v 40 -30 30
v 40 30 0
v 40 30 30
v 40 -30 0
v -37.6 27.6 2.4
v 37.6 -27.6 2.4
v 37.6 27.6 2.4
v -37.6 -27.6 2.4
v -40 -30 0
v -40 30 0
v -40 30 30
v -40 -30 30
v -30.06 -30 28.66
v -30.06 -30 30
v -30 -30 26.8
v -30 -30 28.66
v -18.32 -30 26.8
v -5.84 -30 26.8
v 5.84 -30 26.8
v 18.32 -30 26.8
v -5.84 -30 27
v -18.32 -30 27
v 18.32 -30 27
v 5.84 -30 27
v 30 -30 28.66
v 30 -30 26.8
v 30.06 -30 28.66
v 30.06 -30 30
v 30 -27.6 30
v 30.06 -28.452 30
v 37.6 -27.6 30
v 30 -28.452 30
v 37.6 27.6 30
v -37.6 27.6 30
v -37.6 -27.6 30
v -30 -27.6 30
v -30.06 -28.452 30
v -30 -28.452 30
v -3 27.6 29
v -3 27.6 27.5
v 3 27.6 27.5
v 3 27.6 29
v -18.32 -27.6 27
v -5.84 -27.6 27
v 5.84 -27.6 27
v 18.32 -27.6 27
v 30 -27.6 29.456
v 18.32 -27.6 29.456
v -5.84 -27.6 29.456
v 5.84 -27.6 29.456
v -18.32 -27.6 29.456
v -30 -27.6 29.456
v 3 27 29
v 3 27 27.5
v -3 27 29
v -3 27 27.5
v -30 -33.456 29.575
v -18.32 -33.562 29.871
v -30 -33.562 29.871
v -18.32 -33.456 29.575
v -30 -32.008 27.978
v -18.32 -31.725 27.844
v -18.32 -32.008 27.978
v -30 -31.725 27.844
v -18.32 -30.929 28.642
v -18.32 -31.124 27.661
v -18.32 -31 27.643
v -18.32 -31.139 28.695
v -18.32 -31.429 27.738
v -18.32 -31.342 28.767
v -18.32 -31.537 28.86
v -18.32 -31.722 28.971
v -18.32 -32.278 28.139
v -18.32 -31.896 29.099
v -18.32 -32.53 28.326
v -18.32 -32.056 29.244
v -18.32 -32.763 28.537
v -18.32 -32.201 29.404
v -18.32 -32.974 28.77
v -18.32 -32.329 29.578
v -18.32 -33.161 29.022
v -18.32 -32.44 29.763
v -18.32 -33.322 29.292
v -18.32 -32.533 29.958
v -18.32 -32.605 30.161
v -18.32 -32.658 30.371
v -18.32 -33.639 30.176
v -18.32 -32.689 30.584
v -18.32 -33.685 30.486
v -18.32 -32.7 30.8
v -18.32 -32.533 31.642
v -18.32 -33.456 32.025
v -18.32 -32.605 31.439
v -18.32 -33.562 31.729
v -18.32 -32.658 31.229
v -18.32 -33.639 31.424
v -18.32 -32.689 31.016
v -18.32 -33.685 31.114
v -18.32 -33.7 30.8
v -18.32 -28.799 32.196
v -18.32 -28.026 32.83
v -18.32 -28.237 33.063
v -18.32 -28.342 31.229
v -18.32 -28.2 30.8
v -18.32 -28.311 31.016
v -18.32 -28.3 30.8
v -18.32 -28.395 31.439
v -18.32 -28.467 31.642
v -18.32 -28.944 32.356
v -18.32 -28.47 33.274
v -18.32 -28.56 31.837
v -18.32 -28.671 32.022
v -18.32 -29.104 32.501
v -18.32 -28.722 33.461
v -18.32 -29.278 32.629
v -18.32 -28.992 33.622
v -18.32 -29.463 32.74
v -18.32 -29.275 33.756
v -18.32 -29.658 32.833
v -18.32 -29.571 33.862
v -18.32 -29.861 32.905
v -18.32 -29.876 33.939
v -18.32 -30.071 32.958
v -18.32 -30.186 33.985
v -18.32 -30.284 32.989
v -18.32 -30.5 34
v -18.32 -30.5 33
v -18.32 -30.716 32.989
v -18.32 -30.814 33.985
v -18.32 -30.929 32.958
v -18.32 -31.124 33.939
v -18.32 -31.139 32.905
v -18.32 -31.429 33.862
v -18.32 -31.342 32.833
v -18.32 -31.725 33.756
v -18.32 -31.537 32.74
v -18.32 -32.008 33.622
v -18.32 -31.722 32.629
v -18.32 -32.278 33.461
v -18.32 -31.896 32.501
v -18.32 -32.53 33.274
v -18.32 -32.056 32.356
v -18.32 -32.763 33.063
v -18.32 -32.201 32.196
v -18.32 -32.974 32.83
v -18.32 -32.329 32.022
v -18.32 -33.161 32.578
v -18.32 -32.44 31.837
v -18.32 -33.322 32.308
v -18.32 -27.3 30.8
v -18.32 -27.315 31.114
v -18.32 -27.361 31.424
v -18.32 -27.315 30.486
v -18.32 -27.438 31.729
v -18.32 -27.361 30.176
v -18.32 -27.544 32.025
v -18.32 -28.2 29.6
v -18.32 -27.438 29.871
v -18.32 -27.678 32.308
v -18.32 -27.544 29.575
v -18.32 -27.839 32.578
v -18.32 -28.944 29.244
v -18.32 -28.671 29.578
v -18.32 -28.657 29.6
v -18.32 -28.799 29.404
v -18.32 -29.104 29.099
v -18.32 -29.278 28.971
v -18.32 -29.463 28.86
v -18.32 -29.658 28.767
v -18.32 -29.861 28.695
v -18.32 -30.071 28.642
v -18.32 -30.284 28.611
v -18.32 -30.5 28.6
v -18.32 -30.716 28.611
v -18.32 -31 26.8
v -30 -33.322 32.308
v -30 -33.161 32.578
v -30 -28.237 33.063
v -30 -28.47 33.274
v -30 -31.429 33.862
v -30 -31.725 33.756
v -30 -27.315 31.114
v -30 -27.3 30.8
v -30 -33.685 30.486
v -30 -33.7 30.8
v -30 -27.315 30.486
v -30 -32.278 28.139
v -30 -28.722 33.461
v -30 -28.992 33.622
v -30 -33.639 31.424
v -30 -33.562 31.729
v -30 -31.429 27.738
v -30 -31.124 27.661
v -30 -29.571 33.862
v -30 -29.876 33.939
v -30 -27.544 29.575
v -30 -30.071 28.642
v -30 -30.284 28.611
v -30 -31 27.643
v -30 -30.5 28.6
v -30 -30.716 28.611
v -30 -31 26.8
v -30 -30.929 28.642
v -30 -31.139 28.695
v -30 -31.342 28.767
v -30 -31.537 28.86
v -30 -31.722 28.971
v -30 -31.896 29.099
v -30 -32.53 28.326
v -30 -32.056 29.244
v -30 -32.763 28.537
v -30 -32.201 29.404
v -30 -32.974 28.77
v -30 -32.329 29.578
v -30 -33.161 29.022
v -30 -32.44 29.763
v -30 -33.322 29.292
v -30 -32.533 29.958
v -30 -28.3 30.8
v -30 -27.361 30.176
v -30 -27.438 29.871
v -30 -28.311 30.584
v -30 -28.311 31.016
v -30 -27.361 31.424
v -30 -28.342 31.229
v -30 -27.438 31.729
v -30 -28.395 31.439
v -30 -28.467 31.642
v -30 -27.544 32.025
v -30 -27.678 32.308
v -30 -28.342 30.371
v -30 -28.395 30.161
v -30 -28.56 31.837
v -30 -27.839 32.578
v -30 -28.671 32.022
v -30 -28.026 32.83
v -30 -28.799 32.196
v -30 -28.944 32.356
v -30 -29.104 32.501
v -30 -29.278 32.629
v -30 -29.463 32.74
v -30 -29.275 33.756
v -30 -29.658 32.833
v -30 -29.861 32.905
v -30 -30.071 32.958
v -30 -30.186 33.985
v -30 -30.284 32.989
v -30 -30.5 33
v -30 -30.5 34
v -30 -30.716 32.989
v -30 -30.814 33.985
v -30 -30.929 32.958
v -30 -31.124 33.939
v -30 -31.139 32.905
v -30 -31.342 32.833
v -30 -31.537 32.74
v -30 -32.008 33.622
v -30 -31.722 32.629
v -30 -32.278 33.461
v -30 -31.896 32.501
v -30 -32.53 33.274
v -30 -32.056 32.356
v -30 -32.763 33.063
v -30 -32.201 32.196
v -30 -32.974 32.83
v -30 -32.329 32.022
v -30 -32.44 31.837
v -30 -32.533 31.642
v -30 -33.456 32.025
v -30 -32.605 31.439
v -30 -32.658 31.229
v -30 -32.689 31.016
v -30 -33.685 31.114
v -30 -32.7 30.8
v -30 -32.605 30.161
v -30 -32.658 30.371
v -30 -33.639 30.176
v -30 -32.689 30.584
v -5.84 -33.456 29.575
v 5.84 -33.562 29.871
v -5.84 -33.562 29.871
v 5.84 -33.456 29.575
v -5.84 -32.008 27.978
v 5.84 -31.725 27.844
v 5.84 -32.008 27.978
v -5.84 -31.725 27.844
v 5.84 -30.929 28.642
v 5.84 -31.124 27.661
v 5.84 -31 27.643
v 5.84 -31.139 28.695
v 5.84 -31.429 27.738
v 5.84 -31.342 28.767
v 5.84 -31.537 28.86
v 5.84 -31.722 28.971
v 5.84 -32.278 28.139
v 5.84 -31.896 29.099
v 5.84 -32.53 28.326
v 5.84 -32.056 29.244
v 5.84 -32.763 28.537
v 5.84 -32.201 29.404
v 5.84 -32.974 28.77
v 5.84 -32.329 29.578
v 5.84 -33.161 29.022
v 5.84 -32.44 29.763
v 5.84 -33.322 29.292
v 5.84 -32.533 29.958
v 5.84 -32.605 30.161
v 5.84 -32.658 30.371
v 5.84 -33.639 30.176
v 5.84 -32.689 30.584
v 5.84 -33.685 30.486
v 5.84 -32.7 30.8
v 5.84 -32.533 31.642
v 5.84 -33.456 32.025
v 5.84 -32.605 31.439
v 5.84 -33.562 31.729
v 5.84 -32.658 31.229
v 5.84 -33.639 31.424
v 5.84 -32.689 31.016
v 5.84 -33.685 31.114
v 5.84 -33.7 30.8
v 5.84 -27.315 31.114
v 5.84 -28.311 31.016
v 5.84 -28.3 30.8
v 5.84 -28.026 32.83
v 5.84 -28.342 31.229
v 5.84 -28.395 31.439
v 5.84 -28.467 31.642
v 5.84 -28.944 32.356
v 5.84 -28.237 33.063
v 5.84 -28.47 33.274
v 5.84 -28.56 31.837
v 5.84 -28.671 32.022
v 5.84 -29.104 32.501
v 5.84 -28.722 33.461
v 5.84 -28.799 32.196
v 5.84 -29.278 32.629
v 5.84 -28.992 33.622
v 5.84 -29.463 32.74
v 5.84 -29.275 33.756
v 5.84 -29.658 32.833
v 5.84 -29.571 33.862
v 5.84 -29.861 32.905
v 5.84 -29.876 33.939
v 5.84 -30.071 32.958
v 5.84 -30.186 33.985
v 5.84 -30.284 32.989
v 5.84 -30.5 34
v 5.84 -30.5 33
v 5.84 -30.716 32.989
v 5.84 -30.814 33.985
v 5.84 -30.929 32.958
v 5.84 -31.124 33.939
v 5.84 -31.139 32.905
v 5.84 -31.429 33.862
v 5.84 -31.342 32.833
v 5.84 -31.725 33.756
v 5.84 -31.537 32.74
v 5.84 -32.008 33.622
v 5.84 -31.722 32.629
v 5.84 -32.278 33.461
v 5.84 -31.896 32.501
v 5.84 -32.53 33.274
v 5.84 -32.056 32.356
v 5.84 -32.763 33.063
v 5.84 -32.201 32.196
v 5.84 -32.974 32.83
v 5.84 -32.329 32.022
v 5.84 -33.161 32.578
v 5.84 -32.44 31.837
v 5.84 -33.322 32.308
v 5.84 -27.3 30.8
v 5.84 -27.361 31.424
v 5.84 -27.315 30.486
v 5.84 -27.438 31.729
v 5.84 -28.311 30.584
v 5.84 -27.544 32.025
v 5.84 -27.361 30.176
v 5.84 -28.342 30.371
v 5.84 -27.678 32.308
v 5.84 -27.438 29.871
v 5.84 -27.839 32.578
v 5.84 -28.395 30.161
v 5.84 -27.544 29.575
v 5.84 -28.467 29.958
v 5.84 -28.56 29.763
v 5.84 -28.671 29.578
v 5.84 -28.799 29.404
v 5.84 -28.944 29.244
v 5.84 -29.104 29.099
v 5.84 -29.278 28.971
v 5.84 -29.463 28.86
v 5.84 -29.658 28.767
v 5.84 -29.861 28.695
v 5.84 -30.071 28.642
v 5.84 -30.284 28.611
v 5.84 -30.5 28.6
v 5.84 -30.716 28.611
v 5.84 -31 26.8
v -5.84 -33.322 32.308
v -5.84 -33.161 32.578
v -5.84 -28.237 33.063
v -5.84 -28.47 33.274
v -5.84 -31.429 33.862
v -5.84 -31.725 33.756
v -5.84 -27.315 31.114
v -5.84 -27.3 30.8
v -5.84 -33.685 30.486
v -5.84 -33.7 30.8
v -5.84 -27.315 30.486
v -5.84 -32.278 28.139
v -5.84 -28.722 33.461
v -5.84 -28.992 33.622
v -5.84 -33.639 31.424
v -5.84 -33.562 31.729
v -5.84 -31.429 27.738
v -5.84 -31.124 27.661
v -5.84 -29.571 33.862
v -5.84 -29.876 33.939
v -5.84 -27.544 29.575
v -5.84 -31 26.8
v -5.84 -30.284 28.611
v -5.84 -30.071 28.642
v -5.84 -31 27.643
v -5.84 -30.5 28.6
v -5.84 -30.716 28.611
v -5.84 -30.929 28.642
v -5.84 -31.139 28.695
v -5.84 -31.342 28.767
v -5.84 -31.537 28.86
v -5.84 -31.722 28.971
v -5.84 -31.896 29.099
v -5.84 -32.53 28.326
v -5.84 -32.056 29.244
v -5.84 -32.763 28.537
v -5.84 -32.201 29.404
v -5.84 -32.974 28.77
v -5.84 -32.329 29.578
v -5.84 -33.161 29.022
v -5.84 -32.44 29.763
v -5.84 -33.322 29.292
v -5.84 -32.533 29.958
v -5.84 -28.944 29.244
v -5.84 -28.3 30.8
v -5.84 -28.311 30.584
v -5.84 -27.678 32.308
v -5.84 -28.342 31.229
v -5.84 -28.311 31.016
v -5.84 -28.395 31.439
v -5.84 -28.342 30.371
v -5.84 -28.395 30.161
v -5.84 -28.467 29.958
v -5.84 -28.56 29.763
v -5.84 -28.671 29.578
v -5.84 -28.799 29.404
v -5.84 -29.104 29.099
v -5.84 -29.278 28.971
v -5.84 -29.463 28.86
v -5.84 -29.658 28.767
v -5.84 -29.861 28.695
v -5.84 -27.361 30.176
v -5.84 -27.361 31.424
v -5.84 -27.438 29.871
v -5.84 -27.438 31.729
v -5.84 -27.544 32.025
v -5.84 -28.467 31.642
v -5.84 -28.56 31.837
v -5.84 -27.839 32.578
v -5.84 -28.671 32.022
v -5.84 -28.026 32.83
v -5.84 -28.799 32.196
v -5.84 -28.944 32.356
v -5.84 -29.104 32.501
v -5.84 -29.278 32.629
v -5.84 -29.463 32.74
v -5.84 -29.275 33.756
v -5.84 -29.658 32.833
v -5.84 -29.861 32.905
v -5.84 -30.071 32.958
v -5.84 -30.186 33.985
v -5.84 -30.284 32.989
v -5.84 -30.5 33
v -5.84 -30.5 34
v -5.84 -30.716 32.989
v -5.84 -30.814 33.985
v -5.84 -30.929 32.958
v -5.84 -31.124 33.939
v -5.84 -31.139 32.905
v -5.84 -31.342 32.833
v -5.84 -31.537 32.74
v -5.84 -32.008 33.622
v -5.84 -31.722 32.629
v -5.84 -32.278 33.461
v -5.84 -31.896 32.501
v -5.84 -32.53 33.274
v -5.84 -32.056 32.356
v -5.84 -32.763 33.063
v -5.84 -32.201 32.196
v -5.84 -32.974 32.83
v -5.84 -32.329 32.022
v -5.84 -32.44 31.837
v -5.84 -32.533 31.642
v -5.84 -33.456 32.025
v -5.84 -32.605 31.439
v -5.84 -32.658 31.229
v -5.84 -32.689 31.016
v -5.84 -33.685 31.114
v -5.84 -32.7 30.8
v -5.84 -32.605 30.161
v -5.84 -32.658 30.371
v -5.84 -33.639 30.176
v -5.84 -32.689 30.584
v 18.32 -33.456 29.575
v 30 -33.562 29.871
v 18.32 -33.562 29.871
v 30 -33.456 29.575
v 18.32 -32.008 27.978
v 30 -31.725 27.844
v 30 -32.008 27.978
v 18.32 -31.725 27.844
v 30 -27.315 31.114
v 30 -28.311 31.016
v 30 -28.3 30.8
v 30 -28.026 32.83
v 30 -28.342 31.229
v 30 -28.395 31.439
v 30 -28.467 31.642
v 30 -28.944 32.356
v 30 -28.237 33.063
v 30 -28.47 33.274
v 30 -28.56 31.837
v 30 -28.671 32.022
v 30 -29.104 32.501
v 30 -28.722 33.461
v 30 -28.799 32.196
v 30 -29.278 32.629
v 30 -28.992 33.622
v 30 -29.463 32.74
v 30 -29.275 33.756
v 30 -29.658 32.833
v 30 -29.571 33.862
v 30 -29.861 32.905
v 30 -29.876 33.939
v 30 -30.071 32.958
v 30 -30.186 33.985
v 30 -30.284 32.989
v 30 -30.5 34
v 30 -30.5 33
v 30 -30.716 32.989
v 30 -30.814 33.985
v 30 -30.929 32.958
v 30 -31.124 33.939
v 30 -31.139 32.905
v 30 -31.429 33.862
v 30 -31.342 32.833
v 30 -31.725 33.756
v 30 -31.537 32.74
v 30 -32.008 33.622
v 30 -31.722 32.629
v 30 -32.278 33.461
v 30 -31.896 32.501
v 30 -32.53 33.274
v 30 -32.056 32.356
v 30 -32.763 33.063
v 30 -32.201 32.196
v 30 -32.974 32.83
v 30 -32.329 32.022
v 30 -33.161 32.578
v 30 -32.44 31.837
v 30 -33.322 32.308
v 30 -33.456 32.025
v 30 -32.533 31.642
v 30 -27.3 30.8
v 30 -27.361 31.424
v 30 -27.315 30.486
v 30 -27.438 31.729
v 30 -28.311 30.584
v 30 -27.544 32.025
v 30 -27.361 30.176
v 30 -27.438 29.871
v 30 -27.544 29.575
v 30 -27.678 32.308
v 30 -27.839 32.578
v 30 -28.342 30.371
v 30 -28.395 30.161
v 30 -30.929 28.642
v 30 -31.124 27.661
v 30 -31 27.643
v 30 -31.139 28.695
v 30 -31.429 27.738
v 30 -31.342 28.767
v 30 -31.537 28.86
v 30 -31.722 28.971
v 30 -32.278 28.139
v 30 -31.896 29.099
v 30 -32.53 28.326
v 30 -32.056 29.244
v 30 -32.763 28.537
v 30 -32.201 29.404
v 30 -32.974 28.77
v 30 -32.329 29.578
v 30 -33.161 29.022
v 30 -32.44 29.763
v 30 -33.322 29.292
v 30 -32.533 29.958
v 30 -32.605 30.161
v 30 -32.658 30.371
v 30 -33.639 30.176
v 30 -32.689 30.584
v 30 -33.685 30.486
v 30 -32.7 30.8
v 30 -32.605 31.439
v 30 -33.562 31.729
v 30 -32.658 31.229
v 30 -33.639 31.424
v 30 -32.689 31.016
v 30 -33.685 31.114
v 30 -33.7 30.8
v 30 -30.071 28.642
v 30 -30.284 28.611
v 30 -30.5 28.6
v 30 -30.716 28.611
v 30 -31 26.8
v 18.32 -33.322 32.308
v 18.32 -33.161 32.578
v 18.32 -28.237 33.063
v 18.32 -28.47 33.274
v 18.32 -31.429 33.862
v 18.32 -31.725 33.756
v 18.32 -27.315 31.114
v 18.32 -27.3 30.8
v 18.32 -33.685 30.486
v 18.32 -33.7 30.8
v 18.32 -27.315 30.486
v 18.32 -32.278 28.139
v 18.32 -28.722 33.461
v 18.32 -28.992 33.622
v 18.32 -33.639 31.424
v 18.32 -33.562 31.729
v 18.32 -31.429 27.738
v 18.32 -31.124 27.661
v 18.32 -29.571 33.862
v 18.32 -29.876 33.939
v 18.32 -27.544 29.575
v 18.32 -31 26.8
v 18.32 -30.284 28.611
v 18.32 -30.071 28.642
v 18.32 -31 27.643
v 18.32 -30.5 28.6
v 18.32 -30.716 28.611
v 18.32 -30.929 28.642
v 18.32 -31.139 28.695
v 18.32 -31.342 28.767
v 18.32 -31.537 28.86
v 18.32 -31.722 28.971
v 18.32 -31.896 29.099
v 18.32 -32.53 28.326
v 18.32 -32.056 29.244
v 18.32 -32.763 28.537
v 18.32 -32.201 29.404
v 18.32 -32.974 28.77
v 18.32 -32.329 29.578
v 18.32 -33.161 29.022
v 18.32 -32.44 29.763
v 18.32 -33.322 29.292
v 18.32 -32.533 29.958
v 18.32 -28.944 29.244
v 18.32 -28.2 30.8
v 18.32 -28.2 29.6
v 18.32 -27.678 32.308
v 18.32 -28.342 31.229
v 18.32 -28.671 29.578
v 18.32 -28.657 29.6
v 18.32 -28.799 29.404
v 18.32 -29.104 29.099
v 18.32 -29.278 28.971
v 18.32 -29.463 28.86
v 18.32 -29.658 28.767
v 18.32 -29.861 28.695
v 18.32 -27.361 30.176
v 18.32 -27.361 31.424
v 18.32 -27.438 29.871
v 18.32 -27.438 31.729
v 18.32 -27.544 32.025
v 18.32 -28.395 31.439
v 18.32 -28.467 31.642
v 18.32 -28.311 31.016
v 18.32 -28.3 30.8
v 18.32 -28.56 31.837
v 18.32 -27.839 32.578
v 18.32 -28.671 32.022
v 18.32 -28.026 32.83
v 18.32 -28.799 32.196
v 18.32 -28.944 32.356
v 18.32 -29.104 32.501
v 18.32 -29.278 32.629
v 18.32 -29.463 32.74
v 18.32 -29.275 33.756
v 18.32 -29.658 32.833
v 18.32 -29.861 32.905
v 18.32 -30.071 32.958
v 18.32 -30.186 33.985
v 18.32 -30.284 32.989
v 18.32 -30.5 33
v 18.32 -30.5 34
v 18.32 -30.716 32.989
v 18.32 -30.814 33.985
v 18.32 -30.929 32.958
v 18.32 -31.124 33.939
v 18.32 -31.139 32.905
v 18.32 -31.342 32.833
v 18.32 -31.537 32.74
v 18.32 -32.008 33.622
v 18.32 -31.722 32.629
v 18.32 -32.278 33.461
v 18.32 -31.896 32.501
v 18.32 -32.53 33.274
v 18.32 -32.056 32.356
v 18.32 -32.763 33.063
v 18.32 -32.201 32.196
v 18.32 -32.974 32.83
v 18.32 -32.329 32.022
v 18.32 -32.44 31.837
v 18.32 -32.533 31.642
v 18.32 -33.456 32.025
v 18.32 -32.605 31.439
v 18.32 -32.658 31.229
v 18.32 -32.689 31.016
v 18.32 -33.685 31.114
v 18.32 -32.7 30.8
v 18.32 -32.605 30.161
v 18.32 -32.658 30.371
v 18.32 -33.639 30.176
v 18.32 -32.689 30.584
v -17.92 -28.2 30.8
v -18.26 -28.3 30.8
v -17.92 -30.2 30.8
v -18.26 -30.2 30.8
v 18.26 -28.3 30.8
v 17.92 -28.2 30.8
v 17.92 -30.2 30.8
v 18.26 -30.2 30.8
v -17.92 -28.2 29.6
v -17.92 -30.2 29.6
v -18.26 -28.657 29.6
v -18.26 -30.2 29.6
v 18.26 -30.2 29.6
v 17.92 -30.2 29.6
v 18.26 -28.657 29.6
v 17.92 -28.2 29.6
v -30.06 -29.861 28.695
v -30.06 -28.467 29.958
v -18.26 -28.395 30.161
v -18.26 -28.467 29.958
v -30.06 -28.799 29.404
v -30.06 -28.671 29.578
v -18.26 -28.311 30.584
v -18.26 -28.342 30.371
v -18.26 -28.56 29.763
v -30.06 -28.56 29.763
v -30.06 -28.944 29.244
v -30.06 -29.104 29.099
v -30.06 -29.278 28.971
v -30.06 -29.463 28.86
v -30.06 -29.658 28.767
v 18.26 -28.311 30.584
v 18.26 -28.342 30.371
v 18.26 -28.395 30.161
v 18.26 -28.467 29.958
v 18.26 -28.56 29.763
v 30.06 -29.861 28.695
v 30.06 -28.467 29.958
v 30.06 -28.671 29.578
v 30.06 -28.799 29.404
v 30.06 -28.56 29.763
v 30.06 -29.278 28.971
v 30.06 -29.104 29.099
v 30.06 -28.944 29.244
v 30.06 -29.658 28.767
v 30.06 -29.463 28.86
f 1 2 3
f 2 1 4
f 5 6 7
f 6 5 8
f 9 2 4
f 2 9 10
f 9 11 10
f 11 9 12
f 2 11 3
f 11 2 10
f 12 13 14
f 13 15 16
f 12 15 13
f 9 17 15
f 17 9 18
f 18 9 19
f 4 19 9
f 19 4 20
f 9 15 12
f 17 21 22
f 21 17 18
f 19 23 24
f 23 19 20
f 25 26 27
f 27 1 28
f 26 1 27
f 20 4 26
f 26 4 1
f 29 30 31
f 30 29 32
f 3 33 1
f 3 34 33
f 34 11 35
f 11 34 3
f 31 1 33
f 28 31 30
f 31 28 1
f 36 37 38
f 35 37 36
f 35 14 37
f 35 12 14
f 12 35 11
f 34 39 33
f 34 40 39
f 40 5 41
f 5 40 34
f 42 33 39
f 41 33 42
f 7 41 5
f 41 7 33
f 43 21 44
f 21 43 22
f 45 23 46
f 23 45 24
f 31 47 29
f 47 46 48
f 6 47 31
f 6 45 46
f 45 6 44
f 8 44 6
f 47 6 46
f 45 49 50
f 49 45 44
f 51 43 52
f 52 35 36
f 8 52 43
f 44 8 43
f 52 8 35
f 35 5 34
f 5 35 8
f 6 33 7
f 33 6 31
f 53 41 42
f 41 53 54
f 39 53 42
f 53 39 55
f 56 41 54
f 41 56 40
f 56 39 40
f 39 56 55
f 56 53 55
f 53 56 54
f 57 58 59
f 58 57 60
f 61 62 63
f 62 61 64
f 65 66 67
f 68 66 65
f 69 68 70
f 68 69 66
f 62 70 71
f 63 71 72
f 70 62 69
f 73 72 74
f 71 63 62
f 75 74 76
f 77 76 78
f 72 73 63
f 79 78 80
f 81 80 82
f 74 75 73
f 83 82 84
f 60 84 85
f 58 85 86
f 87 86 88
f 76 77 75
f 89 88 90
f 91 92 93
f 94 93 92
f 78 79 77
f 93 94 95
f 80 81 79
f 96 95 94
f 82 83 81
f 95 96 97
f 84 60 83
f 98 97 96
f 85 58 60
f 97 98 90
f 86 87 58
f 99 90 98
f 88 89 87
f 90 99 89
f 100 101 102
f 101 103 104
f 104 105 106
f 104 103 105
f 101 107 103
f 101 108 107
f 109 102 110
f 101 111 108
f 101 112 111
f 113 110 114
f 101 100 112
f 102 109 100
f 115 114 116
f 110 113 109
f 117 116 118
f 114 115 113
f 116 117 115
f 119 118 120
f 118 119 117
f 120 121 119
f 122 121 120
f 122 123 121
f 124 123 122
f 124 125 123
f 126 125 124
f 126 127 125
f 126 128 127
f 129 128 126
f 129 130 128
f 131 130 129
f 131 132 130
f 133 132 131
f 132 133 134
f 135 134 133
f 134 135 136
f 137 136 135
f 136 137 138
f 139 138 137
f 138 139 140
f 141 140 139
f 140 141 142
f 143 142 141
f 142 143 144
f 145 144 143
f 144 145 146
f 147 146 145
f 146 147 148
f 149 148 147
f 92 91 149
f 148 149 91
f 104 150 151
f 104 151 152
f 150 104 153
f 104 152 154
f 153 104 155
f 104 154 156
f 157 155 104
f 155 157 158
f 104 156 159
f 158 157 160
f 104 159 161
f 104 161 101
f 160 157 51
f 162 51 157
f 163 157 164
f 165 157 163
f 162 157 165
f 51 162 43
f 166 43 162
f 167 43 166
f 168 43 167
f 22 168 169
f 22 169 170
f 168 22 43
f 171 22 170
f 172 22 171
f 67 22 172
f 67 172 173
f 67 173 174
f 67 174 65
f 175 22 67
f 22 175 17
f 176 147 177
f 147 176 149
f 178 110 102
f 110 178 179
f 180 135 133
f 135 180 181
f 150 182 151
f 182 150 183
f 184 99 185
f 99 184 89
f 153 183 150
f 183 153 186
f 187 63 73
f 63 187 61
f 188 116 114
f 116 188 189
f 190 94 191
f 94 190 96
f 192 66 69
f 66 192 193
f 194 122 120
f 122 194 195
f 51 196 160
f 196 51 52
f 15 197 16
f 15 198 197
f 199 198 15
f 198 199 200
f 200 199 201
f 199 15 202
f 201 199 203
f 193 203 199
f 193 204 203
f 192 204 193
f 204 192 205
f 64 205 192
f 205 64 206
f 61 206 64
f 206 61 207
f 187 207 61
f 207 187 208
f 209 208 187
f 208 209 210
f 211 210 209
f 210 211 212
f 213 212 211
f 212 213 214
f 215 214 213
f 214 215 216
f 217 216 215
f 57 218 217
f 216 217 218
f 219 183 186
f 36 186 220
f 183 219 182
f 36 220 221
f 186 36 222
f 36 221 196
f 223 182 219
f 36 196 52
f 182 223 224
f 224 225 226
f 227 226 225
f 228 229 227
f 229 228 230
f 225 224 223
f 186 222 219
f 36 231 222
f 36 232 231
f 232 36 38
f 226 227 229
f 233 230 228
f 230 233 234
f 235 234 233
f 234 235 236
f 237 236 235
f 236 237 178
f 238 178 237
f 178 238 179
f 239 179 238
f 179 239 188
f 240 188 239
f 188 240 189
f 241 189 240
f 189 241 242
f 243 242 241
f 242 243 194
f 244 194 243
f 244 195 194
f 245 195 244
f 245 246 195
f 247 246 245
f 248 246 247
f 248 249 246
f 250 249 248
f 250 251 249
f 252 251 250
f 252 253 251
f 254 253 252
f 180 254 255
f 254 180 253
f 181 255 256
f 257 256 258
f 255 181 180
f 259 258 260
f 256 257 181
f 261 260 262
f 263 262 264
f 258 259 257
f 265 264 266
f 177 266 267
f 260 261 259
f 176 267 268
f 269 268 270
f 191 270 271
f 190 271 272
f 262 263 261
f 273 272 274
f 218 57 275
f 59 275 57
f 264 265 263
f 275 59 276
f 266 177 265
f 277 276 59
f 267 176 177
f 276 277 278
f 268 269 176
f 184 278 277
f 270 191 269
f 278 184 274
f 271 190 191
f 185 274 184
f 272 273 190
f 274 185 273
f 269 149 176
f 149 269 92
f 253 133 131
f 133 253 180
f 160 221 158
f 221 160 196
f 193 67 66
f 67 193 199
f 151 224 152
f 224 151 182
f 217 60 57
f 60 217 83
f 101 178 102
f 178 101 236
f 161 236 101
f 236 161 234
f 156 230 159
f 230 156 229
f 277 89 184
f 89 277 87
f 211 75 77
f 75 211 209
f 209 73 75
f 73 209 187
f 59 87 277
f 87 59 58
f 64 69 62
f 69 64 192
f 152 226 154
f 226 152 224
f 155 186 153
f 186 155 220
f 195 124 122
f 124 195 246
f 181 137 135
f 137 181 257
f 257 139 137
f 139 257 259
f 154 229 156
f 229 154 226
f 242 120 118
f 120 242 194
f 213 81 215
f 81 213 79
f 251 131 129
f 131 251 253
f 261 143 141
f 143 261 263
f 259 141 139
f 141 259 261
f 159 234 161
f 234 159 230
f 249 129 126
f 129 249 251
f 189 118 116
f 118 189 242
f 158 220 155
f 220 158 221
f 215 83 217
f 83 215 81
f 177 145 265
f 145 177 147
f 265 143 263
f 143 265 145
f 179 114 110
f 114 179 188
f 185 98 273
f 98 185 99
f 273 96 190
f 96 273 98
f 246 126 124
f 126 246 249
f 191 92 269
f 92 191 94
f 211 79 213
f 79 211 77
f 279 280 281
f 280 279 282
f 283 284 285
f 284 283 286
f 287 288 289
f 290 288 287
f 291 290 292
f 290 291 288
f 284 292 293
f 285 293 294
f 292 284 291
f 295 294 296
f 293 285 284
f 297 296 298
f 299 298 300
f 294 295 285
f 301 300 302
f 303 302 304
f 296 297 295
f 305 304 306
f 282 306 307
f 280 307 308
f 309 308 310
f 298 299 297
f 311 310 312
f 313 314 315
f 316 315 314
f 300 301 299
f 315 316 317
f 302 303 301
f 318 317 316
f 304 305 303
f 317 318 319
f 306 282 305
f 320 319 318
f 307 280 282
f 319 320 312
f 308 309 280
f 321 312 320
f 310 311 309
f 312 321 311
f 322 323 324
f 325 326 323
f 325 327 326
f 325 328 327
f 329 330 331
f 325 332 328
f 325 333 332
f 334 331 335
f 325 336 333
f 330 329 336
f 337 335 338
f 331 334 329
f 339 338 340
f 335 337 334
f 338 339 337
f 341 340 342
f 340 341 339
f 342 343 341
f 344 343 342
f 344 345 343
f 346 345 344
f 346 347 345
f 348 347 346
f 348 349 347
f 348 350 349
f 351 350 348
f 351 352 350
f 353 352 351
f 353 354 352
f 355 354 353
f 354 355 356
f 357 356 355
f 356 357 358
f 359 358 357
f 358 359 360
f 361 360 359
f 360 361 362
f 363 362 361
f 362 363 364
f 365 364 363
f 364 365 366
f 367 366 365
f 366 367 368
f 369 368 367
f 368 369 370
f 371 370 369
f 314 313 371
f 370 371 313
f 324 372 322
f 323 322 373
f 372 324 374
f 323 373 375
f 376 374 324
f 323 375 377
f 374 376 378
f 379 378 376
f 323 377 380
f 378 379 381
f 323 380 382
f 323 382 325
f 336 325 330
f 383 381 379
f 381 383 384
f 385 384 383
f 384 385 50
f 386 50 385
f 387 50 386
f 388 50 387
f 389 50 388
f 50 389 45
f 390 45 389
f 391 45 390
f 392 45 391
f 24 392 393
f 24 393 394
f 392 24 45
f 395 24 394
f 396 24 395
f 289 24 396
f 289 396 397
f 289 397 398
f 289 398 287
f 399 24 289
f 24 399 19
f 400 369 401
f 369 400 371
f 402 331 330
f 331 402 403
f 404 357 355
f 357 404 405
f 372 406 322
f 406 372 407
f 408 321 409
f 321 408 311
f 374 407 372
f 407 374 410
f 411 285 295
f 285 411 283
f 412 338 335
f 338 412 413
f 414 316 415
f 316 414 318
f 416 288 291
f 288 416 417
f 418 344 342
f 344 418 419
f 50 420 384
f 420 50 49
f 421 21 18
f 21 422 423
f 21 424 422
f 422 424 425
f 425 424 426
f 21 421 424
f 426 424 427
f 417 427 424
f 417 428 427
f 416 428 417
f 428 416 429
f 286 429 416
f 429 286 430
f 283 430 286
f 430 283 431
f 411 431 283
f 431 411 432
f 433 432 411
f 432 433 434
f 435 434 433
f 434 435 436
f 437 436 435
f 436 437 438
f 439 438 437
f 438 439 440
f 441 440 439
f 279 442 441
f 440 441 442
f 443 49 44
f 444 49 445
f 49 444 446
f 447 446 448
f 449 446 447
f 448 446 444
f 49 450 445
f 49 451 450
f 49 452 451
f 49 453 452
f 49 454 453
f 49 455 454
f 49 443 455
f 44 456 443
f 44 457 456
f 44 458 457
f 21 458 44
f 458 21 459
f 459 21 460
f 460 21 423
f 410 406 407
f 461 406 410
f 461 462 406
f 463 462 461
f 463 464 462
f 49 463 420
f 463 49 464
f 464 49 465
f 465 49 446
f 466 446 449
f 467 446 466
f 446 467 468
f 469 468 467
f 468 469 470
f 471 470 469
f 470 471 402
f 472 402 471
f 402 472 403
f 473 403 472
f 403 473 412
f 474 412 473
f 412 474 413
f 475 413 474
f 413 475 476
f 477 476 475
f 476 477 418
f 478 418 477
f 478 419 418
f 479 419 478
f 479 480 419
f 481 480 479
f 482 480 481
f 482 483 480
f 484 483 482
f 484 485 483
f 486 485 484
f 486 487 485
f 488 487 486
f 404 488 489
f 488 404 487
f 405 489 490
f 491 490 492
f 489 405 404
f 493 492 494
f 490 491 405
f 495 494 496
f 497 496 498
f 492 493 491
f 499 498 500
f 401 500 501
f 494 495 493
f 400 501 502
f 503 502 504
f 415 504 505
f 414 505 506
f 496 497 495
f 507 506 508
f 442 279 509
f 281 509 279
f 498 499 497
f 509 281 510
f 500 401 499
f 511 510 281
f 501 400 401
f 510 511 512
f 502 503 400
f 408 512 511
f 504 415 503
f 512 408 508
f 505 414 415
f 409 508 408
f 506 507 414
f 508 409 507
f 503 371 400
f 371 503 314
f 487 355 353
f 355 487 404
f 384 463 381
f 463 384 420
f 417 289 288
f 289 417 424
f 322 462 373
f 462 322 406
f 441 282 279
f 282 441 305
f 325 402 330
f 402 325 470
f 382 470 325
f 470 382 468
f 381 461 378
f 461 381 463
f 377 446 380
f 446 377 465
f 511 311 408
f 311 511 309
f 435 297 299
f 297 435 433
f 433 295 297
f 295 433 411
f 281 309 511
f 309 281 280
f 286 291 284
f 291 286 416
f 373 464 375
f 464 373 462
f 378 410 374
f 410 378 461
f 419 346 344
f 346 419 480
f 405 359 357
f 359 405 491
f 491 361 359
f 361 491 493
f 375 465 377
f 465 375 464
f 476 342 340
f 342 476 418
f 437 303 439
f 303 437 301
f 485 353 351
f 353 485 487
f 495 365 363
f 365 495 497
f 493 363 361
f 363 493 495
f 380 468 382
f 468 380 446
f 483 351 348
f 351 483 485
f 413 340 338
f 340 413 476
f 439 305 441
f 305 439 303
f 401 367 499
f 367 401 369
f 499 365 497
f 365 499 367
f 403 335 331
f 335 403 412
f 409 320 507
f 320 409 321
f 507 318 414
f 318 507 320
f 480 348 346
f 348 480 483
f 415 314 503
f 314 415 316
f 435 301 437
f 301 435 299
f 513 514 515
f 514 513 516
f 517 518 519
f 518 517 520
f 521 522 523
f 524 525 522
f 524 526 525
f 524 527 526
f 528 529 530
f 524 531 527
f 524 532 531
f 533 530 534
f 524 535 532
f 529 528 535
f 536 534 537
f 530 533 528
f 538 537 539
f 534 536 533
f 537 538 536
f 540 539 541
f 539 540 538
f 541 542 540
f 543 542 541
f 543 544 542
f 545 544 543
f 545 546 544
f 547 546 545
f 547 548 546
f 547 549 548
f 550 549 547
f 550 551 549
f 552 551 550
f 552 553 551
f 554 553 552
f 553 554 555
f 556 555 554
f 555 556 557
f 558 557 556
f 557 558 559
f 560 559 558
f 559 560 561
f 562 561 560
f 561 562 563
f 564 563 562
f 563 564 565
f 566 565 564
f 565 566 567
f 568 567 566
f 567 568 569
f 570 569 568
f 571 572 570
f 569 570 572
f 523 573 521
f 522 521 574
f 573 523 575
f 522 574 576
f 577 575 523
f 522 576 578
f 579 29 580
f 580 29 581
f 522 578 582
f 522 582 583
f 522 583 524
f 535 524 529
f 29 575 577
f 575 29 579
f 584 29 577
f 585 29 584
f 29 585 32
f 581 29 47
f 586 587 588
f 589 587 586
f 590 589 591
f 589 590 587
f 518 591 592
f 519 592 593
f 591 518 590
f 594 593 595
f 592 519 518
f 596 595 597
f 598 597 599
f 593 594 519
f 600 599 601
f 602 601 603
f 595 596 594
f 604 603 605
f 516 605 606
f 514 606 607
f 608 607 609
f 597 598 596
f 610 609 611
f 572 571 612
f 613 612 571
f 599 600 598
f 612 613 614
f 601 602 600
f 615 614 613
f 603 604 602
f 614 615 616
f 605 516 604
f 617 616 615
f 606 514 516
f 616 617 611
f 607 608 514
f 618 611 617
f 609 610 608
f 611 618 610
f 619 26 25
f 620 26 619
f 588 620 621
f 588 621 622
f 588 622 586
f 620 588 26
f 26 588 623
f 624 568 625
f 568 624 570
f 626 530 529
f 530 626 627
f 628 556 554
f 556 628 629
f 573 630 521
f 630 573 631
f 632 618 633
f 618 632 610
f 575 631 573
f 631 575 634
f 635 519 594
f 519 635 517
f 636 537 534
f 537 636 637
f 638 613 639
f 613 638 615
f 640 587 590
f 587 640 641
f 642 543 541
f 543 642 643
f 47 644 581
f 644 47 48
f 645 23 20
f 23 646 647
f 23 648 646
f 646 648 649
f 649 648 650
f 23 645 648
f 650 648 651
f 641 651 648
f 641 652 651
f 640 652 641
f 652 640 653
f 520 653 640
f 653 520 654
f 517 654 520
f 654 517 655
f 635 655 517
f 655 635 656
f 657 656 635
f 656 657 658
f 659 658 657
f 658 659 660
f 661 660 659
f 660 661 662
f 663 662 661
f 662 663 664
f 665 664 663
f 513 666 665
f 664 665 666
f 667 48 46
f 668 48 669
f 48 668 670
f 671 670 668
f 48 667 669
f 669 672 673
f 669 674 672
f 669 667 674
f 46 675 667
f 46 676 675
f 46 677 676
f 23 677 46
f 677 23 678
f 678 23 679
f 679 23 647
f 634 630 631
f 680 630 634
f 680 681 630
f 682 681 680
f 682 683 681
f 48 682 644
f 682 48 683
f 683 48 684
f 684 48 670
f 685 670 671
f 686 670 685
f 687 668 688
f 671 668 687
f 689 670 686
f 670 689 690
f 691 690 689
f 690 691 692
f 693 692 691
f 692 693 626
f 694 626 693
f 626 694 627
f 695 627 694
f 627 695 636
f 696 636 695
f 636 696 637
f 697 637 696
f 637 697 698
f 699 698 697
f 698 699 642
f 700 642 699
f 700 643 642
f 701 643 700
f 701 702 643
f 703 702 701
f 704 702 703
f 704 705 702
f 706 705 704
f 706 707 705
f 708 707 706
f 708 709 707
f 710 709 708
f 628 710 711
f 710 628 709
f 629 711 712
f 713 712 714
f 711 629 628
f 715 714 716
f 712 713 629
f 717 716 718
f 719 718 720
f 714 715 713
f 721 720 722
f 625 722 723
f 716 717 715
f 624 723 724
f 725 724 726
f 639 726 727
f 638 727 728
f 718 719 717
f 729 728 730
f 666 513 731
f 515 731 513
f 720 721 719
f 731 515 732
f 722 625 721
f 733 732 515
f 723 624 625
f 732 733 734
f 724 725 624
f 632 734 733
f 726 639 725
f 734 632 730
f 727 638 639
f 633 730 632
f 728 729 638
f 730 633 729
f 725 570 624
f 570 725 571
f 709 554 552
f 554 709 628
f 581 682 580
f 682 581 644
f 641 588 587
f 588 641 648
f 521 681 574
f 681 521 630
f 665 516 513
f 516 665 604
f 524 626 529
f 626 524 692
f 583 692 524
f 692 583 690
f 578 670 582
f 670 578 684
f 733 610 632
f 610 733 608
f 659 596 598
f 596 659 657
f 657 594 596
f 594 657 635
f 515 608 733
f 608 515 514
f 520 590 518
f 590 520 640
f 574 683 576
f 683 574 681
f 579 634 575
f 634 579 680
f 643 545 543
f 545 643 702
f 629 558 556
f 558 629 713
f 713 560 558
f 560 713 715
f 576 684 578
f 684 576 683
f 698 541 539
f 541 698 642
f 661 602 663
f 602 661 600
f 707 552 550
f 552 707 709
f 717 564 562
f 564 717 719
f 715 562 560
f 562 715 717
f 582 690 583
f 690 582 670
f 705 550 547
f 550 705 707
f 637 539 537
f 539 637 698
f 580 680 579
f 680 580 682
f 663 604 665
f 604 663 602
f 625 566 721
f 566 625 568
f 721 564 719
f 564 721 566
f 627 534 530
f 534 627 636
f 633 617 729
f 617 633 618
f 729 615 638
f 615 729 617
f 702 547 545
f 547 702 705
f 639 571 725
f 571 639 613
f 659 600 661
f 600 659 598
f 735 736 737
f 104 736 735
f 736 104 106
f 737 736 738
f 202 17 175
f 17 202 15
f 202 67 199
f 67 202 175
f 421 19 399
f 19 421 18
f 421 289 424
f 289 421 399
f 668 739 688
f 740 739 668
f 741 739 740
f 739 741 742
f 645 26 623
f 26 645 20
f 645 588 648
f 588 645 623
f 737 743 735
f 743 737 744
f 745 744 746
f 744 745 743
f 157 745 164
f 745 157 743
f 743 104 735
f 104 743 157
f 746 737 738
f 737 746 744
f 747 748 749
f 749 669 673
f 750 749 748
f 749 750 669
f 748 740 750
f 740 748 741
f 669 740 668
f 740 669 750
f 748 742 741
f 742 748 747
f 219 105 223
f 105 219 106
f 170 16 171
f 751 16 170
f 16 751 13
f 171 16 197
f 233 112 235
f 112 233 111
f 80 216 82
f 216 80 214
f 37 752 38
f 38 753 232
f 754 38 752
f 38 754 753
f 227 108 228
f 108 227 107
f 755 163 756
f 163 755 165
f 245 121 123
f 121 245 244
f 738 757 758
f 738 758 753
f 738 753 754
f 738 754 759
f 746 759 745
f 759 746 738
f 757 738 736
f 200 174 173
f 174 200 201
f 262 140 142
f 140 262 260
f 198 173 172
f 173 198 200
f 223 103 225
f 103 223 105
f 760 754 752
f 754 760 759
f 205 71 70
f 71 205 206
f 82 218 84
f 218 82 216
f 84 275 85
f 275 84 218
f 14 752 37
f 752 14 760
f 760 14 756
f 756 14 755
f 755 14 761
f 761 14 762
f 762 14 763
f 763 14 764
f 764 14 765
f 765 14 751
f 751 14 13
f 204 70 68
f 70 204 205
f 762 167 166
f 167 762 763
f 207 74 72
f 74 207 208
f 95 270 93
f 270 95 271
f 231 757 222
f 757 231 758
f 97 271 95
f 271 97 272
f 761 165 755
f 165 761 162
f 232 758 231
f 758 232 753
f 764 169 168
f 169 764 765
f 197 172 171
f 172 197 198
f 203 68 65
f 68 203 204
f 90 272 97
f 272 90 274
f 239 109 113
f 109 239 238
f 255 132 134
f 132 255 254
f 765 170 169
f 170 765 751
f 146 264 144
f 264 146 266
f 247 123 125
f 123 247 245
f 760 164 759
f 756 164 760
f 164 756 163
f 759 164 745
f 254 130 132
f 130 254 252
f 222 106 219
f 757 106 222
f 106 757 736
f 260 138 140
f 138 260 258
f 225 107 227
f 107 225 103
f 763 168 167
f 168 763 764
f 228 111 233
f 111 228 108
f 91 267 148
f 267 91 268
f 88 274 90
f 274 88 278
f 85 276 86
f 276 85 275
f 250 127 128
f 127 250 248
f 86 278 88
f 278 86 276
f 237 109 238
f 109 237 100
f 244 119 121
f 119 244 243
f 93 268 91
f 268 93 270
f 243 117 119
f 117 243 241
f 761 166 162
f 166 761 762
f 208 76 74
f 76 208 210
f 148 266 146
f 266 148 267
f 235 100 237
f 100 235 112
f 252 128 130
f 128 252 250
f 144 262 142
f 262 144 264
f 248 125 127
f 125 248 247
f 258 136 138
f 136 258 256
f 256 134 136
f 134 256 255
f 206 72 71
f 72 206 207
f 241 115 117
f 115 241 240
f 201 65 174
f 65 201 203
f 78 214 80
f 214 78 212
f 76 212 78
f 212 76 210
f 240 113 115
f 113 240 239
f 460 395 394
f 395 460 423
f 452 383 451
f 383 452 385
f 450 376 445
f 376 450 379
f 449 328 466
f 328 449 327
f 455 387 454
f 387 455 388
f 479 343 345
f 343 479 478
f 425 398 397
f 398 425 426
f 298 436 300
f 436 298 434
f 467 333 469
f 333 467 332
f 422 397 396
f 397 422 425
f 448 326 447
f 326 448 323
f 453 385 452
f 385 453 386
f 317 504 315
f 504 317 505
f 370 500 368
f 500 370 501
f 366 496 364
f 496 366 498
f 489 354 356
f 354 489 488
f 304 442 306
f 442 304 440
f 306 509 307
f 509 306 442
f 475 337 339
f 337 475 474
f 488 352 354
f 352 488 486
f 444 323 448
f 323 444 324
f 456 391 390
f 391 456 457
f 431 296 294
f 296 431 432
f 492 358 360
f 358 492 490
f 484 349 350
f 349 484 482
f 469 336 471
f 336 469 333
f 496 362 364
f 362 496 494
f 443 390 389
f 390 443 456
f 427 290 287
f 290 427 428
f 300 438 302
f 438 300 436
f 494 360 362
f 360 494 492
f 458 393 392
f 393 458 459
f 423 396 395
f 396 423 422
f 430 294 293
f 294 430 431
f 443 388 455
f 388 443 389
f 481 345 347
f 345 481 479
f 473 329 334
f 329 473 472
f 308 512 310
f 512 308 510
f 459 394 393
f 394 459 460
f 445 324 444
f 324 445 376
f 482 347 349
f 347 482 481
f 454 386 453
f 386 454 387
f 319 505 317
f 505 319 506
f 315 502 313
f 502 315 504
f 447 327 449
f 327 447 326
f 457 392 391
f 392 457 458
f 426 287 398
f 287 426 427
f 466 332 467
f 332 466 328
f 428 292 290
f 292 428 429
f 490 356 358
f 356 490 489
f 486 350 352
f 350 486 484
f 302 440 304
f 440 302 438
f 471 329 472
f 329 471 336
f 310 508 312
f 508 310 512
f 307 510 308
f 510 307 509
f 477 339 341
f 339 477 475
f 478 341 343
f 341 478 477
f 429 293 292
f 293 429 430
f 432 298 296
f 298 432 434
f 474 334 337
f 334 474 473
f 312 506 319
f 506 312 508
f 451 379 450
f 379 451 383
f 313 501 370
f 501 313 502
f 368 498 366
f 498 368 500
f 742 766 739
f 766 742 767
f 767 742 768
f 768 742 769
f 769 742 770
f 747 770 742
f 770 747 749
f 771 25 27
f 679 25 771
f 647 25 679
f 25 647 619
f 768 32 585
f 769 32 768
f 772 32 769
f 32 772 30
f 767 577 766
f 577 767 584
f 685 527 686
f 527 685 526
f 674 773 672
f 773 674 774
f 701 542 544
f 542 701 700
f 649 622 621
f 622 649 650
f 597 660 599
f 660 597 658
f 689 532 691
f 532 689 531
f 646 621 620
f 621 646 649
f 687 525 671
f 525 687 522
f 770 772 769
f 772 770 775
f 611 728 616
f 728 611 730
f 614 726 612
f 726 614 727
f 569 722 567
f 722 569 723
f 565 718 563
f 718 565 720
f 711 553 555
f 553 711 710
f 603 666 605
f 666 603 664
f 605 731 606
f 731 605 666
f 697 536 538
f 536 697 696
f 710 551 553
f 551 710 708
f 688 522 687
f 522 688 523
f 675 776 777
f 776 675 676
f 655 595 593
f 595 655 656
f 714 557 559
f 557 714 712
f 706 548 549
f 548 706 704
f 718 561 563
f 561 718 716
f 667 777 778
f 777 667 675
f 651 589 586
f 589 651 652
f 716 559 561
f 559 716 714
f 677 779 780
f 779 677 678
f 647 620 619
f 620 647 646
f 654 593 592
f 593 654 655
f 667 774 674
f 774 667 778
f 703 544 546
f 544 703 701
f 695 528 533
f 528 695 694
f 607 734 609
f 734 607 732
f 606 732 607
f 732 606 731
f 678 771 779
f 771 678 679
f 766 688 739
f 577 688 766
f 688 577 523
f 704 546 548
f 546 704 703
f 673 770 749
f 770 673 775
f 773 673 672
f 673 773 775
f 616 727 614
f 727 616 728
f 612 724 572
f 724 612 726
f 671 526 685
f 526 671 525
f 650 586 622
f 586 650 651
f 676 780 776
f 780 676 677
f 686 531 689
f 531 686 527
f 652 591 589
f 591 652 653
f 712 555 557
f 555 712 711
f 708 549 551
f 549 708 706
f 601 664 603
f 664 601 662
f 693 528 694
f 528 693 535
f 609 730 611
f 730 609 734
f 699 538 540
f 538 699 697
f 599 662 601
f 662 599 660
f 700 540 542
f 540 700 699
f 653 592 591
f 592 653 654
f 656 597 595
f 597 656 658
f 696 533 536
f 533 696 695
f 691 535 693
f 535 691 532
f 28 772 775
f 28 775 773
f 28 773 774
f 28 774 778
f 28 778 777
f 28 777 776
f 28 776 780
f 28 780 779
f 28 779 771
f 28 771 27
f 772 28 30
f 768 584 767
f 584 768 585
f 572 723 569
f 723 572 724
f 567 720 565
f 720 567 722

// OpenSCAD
// Box with print-in-place hinge (v4: bridge webs to kill band overhangs)
part = "box";
cadverify_only = "";
module instance(name, part, unit = 1) {
    echo(cadverify_instance = [name, part, unit]);
    if (cadverify_only == "" || cadverify_only == name) children();
}

Rkn = 3.2; rbore = 2.2; rpin = 1.9;
yh = -30.5; zh = 30.8;
lid_zh = 3.4;
lid_lift = 27.4;
pin_lift_z = 27.8; pin_shift_y = -30.5;
k0x0=-30; k0x1=-18.32;
k1x0=-17.92; k1x1=-6.24;
k2x0=-5.84; k2x1=5.84;
k3x0=6.24; k3x1=17.92;
k4x0=18.32; k4x1=30;

$fn = 64;

module xcyl(x0, x1, r, y, z) {
    translate([x0, y, z]) rotate([0, 90, 0]) cylinder(r = r, h = x1 - x0);
}

module box_part() {
    difference() {
        union() {
            translate([-40, -30, 0]) cube([80, 60, 2.4]);
            translate([-40, 27.6, 2.4]) cube([80, 2.4, 27.6]);
            translate([-40, -30, 2.4]) cube([80, 2.4, 24.6]);
            translate([-40, -30, 27.0]) cube([11, 2.4, 3.0]);
            translate([29, -30, 27.0]) cube([11, 2.4, 3.0]);
            translate([-40, -27.6, 2.4]) cube([2.4, 55.2, 27.6]);
            translate([37.6, -27.6, 2.4]) cube([2.4, 55.2, 27.6]);
            translate([-3, 27.0, 27.5]) cube([6, 0.6, 1.5]);
            // hinge knuckles + support webs tying them to the back wall
            xcyl(k0x0, k0x1, Rkn, yh, zh);
            xcyl(k2x0, k2x1, Rkn, yh, zh);
            xcyl(k4x0, k4x1, Rkn, yh, zh);
            translate([k0x0, -31, 26.8]) cube([k0x1-k0x0, 3.4, 4.0]);
            translate([k2x0, -31, 26.8]) cube([k2x1-k2x0, 3.4, 4.0]);
            translate([k4x0, -31, 26.8]) cube([k4x1-k4x0, 3.4, 4.0]);
            // two bridge webs filling wall-to-knuckle band gaps (support-free cover)
            translate([-18.32, -30.2, 29.6]) cube([0.4, 2.0, 1.2]);
            translate([17.92, -30.2, 29.6]) cube([0.4, 2.0, 1.2]);
        }
        xcyl(k0x0-0.06, k0x1+0.06, rbore, yh, zh);
        xcyl(k2x0-0.06, k2x1+0.06, rbore, yh, zh);
        xcyl(k4x0-0.06, k4x1+0.06, rbore, yh, zh);
    }
}

module lid_part() {
    difference() {
        union() {
            translate([-40, -30, 10.6]) cube([80, 60, 2.4]);
            translate([-40, 27.6, 3]) cube([80, 2.4, 7.6]);
            translate([k1x0, -30, 3]) cube([k1x1-k1x0, 2.4, 7.6]);
            translate([k3x0, -30, 3]) cube([k3x1-k3x0, 2.4, 7.6]);
            translate([-40, -30, 3]) cube([11, 2.4, 7.6]);
            translate([29, -30, 3]) cube([11, 2.4, 7.6]);
            translate([-40, -27.6, 3]) cube([2.4, 55.2, 7.6]);
            translate([37.6, -27.6, 3]) cube([2.4, 55.2, 7.6]);
            translate([-37.2, 25.2, 0]) cube([74.4, 2.0, 10.6]);
            translate([-37.2, -27.2, 0]) cube([74.4, 2.0, 10.6]);
            translate([-37.2, -25.2, 0]) cube([2.0, 50.4, 10.6]);
            translate([35.2, -25.2, 0]) cube([2.0, 50.4, 10.6]);
            xcyl(k1x0, k1x1, Rkn, yh, lid_zh);
            xcyl(k3x0, k3x1, Rkn, yh, lid_zh);
            translate([k1x0, -31, 0]) cube([k1x1-k1x0, 3.4, 5]);
            translate([k3x0, -31, 0]) cube([k3x1-k3x0, 3.4, 5]);
            // filler webs closing lid-knuckle band overlap with box lugs
            translate([-6.24, -30.2, 0]) cube([0.4, 2.0, 1.2]);
            translate([5.84, -30.2, 0]) cube([0.4, 2.0, 1.2]);
        }
        xcyl(k1x0-0.06, k1x1+0.06, rbore, yh, lid_zh);
        xcyl(k3x0-0.06, k3x1+0.06, rbore, yh, lid_zh);
        translate([-3.3, 26.3, -0.05]) cube([6.6, 1.5, 2.05]);
    }
}

module pin_part() {
    union() {
        xcyl(-32.4, 32.4, rpin, 0, 3);
        xcyl(30.4, 32.4, 3, 0, 3);
        xcyl(-32.4, -30.4, 3, 0, 3);
    }
}

if (part == "box") {
    echo(cadverify_spec = [
        ["bounds", [[-40, -33.7, 0], [40, 30, 34.0]]],
        ["bodies", 1],
        ["through_holes", 3],
        ["support_faces", [["bed", "-z", 4000]]],
        ["overhangs_allowed", [["hinge knuckles, bores and wall cutouts print in place", [[-30.2, -33.9, 26.5], [30.2, -27.1, 33.5]]], ["catch bump underside, tiny 3.6 mm2 ledge", [[-3.2, 26.8, 27.3], [3.2, 27.8, 27.7]]]]],
        ["copies", 1],
        ["details", [
            ["floor", "thickness", [0, 0, -1], [0, 0, 1], 2.4],
            ["front_wall", "thickness", [0, 31, 15], [0, -1, 0], 2.4],
            ["cavity", "void", [[-37.6, -27.6, 2.4], [37.6, 27.6, 29.9]], 0.9],
            ["hinge_bore", "hole", [-31, -30.5, 30.8], [1, 0, 0], [[0, 4.4], [11.6, 4.4]]],
            ["catch_bump", "material", [[-3, 27.0, 27.5], [3, 27.6, 29.0]], 0.9],
            ["hinge_view", "view", [[-30, -34, 26.5], [30, -27, 34.5]]]
        ]]
    ]);
    box_part();
} else if (part == "lid") {
    echo(cadverify_spec = [
        ["bounds", [[-40, -33.7, 0], [40, 30, 13]]],
        ["bodies", 1],
        ["through_holes", 2],
        ["support_faces", [["bed", "-z", 300]]],
        ["overhangs_allowed", [
            ["hinge knuckles and bores print in place", [[-18.2, -33.9, 0], [18.2, -27.1, 4.2]]],
            ["lid top bridging over plug cavity", [[-37.2, -24.9, 10.1], [37.2, 25.2, 11.1]]]
        ]],
        ["copies", 1],
        ["details", [
            ["top", "thickness", [0, 0, 14], [0, 0, -1], 2.4],
            ["skirt", "thickness", [0, 31, 6], [0, -1, 0], 2.4],
            ["plug_cavity", "void", [[-35.2, -24.9, 0], [35.2, 25.2, 10.5]], 0.9],
            ["hinge_bore", "hole", [-18.6, -30.5, 3.4], [1, 0, 0], [[0, 4.4], [11.6, 4.4]]],
            ["catch_notch", "void", [[-3.3, 26.3, 0], [3.3, 27.8, 2.0]], 0.9],
            ["catch_view", "view", [[-5, 26, 0], [5, 28.5, 3]]]
        ]]
    ]);
    lid_part();
} else if (part == "pin") {
    echo(cadverify_spec = [
        ["bounds", [[-32.4, -3, 0], [32.4, 3, 6]]],
        ["bodies", 1],
        ["support_faces", []],
        ["overhangs_allowed", [["pin shaft underside bridges with 0.3 gap", [[-32.4, -1.9, 0], [32.4, 1.9, 1.6]]]]],
        ["copies", 1],
        ["details", [
            ["shaft", "thickness", [0, 3, 3], [0, -1, 0], 3.8],
            ["head", "material", [[30.4, -3, 0], [32.4, 3, 6]], 0.7],
            ["pin_view", "view", [[-32.4, -3, 0], [32.4, 3, 6]]]
        ]]
    ]);
    pin_part();
} else if (part == "assembly") {
    echo(cadverify_spec = [
        ["bounds", [[-40, -33.7, 0], [40, 30, 40.4]]],
        ["support_faces", [["bed", "-z", 4000]]],
        ["allowed_interferences", []],
        ["motions", [
            ["lid_open", ["lid"], "rotate", [0, -30.5, 30.8], [1, 0, 0], [0, 110], ["flex", [["lid", "box", 0.5, "catch bump clearance pass"]]]]
        ]],
        ["assembly_order", [
            [["box"], [0, 0, 0]],
            [["lid"], [0, 0, -1]],
            [["pin"], [1, 0, 0]]
        ]],
        ["print_in_place", 0.3],
        ["overhangs_allowed", [
            ["hinge undersides, pin bridge and cutouts in place", [[-33, -34, 26.5], [33, -27, 34.8]]],
            ["lid top bridging over box cavity", [[-37.2, -24.9, 37.5], [37.2, 25.2, 38.5]]]
        ]]
    ]);
    instance("box", "box") box_part();
    instance("lid", "lid") translate([0, 0, lid_lift]) lid_part();
    instance("pin", "pin") translate([0, pin_shift_y, pin_lift_z]) pin_part();
}
